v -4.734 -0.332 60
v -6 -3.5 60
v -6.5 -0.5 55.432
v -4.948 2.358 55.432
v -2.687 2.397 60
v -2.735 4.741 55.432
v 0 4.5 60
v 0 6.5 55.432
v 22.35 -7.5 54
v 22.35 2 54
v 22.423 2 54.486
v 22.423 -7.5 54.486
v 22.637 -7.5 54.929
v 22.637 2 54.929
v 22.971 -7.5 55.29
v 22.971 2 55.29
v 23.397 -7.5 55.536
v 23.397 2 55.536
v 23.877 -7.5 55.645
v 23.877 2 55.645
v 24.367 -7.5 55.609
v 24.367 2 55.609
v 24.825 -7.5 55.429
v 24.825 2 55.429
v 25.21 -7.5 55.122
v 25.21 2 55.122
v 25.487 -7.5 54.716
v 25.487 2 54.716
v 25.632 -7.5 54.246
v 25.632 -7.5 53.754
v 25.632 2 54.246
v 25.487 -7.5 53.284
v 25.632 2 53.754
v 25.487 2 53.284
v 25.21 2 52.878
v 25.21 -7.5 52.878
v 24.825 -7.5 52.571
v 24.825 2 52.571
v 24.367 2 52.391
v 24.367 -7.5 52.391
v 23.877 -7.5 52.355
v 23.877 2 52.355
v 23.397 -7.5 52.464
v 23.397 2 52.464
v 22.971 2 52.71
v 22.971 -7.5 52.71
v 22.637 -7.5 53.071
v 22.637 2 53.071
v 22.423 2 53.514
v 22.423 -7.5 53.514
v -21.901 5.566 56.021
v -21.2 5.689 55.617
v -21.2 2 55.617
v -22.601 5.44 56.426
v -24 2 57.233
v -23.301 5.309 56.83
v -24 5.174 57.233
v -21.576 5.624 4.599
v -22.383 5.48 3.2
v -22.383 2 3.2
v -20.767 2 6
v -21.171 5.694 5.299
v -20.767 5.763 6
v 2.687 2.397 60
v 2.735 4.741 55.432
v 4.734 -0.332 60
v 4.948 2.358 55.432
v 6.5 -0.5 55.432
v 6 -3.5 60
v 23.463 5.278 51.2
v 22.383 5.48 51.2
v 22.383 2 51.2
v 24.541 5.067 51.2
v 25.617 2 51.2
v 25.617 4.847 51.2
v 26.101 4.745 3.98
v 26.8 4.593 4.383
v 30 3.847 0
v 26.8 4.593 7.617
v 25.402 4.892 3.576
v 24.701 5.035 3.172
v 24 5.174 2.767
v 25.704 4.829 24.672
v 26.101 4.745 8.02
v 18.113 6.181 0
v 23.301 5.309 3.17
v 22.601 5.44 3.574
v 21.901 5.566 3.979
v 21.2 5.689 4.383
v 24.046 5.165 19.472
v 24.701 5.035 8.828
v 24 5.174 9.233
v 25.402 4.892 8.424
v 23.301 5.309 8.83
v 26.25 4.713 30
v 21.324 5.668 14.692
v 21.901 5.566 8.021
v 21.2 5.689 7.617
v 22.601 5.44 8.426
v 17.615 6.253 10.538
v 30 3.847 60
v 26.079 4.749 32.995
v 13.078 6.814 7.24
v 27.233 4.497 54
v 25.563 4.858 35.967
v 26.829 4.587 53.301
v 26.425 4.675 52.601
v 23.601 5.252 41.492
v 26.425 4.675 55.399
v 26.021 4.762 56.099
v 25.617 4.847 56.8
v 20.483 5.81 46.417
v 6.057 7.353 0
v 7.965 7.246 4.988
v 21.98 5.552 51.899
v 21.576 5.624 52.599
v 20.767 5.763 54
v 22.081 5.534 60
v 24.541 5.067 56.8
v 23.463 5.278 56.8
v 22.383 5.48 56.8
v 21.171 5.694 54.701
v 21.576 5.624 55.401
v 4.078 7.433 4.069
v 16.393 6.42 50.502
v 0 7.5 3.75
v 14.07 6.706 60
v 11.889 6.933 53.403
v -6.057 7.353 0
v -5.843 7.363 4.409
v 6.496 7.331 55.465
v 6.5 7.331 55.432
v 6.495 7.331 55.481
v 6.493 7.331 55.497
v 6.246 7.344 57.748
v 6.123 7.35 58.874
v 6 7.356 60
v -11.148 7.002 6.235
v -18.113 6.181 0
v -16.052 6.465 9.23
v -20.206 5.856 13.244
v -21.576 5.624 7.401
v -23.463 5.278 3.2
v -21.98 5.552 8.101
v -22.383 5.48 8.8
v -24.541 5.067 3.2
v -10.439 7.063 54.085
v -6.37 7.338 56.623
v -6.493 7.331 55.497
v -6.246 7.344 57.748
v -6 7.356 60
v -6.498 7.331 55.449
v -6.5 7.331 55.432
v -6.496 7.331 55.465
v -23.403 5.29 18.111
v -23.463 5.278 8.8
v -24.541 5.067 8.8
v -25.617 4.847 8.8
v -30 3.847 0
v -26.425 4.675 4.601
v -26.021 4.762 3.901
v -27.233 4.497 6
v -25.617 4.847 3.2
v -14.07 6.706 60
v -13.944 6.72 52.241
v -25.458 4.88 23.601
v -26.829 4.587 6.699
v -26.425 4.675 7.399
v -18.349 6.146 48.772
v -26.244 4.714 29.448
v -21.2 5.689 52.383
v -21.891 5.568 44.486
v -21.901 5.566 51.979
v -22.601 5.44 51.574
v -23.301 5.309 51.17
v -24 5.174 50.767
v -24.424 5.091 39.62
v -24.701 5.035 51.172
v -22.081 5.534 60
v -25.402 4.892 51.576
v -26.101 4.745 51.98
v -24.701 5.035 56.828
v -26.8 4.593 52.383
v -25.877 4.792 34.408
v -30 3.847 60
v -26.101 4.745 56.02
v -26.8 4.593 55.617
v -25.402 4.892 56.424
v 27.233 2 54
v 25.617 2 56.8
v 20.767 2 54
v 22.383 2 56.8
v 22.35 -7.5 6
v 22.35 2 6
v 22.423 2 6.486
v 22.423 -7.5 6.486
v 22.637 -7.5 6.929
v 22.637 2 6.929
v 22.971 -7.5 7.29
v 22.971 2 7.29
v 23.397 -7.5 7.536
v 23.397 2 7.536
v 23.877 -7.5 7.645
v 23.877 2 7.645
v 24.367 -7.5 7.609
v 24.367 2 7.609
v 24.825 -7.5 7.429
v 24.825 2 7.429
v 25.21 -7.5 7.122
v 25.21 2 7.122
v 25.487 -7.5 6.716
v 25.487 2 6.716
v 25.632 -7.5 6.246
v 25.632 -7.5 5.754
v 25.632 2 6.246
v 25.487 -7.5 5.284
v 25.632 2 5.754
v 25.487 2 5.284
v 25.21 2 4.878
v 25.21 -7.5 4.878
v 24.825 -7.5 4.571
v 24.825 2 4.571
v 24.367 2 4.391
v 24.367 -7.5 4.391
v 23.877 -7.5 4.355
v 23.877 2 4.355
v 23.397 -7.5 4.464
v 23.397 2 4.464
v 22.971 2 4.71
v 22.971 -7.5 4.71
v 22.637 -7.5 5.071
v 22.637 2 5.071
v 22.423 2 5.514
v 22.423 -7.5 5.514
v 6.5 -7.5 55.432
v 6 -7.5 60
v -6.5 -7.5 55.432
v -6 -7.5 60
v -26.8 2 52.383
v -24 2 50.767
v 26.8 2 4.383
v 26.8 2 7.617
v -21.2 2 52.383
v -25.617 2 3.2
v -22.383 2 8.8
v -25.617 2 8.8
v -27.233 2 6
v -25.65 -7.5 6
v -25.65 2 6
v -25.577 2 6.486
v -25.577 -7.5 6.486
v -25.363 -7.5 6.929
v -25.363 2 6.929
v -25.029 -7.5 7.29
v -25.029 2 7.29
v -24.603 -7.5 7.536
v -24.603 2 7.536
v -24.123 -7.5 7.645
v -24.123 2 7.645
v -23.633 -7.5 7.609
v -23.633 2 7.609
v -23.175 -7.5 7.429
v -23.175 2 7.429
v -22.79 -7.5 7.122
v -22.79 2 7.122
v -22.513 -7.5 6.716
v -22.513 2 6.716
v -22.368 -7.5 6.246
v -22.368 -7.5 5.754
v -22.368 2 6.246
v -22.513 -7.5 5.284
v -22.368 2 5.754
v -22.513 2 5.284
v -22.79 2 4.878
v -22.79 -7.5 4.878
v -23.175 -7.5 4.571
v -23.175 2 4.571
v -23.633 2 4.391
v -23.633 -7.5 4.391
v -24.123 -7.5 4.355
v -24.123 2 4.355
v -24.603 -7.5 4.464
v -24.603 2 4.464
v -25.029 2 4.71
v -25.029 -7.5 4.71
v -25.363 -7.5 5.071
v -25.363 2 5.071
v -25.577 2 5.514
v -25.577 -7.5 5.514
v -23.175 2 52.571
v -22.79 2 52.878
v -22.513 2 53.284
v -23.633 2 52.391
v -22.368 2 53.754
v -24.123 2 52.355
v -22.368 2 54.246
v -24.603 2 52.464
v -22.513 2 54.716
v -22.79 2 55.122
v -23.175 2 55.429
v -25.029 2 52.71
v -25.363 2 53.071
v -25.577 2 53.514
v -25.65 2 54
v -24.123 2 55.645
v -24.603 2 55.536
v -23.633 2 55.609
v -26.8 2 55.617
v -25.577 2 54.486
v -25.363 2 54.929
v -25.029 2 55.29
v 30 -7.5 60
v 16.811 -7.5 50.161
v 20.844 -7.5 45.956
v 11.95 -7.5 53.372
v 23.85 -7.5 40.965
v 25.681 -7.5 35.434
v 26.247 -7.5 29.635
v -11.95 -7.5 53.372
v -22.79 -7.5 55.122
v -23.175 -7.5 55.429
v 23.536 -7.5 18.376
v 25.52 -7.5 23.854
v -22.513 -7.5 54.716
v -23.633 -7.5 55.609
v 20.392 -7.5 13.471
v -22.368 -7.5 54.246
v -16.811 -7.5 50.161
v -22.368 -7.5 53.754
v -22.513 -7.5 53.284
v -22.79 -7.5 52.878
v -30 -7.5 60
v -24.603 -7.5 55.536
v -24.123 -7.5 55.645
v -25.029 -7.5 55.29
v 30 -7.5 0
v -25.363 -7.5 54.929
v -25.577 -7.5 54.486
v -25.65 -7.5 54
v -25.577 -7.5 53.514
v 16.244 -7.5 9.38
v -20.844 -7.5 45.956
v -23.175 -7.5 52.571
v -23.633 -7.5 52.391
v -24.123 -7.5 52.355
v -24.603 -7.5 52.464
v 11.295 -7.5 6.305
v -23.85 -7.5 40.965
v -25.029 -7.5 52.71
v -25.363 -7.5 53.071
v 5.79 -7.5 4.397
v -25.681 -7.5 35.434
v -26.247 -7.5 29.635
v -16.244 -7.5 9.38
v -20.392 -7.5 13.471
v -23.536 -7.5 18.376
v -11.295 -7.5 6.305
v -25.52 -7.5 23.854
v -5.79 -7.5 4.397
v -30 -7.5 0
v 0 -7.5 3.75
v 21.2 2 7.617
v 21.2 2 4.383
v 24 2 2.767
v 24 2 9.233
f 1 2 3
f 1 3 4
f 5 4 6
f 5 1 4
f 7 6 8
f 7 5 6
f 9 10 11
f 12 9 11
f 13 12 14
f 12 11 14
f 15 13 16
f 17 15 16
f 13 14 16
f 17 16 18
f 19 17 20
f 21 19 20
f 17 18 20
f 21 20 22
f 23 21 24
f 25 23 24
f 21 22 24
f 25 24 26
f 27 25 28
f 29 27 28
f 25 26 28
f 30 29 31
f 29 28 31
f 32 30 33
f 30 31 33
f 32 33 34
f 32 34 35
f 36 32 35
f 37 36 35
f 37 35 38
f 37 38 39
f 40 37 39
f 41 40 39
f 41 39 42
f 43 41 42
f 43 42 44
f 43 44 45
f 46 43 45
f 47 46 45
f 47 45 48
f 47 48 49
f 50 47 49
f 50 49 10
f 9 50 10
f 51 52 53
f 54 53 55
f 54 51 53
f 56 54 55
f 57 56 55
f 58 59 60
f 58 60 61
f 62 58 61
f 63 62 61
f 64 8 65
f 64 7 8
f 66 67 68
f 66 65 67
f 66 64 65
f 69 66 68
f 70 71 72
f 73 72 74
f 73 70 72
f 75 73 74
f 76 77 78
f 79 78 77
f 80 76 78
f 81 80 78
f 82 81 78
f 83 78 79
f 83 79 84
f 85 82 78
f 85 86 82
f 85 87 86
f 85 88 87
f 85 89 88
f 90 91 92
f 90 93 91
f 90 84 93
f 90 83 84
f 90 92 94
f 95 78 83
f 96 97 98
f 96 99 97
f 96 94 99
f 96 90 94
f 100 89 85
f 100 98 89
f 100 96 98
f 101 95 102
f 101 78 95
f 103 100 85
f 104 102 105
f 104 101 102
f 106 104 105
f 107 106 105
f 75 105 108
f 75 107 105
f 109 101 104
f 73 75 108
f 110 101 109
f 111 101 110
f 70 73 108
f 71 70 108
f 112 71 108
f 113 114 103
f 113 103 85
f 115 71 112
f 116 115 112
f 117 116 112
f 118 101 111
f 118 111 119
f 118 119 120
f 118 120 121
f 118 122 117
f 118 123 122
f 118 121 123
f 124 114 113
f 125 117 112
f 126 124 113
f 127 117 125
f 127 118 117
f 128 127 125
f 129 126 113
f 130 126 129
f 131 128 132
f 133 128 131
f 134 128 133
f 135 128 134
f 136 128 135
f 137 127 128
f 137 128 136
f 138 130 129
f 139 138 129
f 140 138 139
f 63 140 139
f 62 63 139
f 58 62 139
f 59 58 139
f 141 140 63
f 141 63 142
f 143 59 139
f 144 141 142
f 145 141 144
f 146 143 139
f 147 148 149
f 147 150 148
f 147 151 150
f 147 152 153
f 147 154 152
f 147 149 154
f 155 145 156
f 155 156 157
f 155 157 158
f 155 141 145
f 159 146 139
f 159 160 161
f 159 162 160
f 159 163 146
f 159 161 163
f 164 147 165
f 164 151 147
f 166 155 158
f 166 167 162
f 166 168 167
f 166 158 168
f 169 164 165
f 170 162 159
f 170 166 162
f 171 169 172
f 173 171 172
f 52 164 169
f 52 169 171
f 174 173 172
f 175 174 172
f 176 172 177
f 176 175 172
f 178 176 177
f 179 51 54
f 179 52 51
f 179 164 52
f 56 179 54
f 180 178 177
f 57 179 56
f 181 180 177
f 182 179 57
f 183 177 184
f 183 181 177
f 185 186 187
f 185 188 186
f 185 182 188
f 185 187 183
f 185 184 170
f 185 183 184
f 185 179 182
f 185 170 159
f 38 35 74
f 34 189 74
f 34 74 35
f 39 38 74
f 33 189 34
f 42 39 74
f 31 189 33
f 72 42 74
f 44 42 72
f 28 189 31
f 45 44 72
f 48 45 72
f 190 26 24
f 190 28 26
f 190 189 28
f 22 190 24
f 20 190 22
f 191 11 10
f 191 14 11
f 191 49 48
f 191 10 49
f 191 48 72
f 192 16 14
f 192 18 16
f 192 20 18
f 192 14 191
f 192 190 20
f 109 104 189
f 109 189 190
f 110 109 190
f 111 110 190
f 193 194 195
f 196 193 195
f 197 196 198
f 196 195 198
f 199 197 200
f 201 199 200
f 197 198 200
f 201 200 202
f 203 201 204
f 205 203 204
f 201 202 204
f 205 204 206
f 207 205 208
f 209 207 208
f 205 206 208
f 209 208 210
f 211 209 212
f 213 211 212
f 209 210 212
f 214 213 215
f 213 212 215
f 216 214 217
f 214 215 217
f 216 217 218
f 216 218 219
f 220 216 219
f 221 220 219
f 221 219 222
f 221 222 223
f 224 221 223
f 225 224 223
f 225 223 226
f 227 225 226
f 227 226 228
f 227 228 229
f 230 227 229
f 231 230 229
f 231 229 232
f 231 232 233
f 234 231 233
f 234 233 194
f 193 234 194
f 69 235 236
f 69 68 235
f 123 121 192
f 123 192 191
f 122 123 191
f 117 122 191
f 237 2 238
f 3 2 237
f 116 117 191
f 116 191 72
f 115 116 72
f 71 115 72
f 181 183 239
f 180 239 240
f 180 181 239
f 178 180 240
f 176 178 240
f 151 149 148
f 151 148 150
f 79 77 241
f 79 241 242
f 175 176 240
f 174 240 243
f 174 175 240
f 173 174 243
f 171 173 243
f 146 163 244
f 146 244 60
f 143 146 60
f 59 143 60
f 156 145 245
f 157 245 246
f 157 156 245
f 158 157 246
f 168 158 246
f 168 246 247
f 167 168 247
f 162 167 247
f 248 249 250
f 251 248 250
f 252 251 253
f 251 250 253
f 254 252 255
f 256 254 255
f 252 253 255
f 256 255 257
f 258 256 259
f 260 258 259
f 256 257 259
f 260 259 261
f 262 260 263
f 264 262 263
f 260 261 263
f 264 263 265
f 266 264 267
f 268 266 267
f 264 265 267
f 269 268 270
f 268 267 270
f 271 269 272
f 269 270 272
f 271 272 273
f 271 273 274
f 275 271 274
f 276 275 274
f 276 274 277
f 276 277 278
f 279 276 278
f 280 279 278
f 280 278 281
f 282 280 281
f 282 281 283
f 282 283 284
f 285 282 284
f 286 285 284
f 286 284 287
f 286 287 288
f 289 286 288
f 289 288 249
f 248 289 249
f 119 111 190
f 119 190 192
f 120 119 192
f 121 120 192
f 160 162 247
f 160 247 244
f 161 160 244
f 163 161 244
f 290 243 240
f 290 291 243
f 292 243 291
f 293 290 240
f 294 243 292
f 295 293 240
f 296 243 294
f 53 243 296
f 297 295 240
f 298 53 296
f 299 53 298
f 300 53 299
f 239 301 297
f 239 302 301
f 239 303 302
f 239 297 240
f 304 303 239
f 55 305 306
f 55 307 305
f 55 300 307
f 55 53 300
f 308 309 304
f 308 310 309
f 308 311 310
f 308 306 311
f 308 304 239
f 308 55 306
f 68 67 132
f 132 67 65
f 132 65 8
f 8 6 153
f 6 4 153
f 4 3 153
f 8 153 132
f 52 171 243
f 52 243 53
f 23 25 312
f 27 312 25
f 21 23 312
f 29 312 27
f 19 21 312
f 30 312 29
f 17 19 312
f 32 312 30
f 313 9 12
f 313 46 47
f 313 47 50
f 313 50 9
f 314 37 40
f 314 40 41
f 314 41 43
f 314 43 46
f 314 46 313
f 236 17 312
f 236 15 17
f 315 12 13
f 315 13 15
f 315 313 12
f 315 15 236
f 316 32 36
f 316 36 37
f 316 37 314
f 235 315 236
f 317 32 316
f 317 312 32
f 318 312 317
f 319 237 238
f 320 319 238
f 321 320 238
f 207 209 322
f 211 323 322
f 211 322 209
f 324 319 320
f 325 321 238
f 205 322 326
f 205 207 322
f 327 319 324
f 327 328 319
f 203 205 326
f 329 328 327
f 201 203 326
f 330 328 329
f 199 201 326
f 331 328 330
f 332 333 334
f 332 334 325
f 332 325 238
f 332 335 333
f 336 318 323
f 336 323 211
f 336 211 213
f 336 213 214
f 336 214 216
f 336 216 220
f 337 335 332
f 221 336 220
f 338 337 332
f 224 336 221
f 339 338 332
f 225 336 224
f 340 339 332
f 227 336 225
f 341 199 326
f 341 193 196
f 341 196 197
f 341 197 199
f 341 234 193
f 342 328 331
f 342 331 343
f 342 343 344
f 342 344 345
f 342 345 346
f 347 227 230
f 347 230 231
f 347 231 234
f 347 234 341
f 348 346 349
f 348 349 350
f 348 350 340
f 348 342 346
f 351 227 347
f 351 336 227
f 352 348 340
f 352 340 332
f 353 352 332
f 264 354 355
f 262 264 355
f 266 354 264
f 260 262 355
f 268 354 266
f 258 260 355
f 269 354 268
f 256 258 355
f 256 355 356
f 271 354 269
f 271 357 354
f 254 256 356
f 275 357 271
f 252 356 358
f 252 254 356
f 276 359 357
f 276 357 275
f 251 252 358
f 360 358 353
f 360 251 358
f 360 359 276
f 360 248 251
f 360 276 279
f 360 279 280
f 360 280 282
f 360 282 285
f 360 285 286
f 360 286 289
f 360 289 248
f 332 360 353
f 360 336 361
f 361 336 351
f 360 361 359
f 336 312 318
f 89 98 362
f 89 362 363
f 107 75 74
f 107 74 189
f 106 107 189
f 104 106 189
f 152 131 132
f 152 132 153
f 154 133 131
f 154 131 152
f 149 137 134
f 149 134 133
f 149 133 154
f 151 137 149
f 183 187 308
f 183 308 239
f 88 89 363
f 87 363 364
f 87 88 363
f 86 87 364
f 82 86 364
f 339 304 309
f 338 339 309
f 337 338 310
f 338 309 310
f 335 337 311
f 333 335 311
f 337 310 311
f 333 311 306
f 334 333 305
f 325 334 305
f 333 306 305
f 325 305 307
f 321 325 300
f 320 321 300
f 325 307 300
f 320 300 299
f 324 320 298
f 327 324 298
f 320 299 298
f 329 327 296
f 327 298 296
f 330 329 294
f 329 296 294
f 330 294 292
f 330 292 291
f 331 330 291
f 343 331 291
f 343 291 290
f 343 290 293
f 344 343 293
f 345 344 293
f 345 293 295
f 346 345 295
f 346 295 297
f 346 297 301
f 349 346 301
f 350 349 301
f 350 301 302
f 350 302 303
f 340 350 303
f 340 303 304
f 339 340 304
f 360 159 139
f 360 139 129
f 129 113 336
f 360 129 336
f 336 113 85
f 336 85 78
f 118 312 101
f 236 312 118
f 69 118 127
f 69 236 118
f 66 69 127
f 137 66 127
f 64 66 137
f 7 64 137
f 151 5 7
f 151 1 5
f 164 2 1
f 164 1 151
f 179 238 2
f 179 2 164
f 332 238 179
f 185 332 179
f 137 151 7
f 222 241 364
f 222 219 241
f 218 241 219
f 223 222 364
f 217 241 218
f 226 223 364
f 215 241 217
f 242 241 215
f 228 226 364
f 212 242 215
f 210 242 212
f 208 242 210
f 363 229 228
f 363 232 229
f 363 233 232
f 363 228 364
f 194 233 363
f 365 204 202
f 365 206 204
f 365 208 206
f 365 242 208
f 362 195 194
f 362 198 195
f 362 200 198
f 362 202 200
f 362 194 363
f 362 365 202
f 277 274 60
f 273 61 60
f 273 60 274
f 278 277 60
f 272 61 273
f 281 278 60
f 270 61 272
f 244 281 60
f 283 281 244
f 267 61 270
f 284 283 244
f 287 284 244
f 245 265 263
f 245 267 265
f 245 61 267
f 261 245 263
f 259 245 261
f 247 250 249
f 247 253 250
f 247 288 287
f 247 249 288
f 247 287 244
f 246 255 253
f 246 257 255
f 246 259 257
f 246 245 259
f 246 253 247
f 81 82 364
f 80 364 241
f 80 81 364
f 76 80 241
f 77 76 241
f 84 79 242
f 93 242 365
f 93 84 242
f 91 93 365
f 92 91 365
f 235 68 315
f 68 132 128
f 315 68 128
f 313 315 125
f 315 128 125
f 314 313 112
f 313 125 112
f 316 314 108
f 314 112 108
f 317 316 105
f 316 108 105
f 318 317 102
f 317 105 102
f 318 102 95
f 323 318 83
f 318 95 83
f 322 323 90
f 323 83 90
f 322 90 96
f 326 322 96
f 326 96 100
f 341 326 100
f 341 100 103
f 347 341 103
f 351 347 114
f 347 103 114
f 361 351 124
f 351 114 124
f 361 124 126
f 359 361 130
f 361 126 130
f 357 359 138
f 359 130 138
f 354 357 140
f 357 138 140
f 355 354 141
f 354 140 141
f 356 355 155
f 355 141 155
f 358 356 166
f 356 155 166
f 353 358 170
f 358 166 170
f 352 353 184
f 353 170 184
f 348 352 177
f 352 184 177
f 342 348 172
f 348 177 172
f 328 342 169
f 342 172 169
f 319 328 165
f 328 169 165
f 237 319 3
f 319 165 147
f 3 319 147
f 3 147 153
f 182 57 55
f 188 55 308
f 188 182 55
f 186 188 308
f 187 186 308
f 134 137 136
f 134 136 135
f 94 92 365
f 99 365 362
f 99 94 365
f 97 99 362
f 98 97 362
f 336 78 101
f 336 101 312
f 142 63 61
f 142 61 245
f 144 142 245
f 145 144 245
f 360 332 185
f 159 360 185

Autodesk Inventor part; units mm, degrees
ref_plane "YZ Plane" through (0, 0, 0) normal (1, 0, 0) x (0, 1, 0)
sketch "Sketch1" plane through (0, 0, 0) normal (0, 0, 1) x (1, 0, 0)
  line L0 (-30, 7.5) -> (30, 7.5)
  line L1 (30, 7.5) -> (30, -7.5)
  line L2 (30, -7.5) -> (-30, -7.5)
  line L3 (-30, -7.5) -> (-30, 7.5)
  line L4 (-30, 7.5) -> (30, -7.5) construction
  line L5 (30, 7.5) -> (-30, -7.5) construction
  point P0 (0, 0)
  dimension "d0" = 60
  dimension "d1" = 15
extrude "Extrusion1" add sketch "Sketch1" along normal blind 60
sketch "Sketch3" plane through (-30, 7.5, 0) normal (0, 1, 0) x (1, 0, 0)
  circle A0 centre (30, -30) radius 26.25
  line L0 (60, 0) -> (0, 0) projected
  line L1 (60, -60) -> (0, -60) projected
  line L2 (60, 0) -> (60, -60) projected
  line L3 (36.5, -55.4325) -> (36, -60)
  line L4 (36, -60) -> (24, -60)
  line L5 (24, -60) -> (23.5, -55.4325)
  point P0 (30, 0)
  point P1 (31.6579, -56.1976)
  point P2 (30, 0)
  point P3 (60, -30)
  point P4 (30, -60)
  point P5 (24, -60)
  dimension "d14" = 52.5
  dimension "d16" = 30
  dimension "d17" = 12
  dimension "d18" = 13
  dimension "d26" = 25.4325
extrude "Extrusion3" cut sketch "Sketch3" against normal blind 15
sketch "Sketch4" plane through (0, 0, 60) normal (0, 0, 1) x (1, 0, 0)
  circle A0 centre (0, -117.5) radius 125
  line L0 (-26.25, 7.5) -> (26.25, 7.5) projected
  point P0 (0, 0)
  point P1 (-6.5, 7.5)
  point P2 (6.5, 7.5)
  dimension "d19" = 250
extrude "Extrusion4" cut sketch "Sketch4" against normal through all keep common part
sketch "Sketch6" plane through (0, 0, 60) normal (0, 0, 1) x (1, 0, 0)
  arc A0 (0, 4.5) -> (-6, -3.5) centre (6.6, -6.7) ccw
  line L0 (0, 0) -> (0, -5.1929) construction
  arc A1 (6, -3.5) -> (0, 4.5) centre (-6.6, -6.7) ccw
  line L1 (-6, -3.5) -> (-6, 7.3559)
  line L2 (6, 7.3559) -> (6, -3.5)
  line L3 (-6, 7.3559) -> (6, 7.3559)
  line L4 (26.25, -7.5) -> (-26.25, -7.5) construction
  line L5 (-6, -7.5) -> (-6, 7.3559) construction
  point P0 (6.5, -7.5)
  point P1 (-6.5, -7.5)
  dimension "d27" = 13
  dimension "d31" = 12
  dimension "d35" = 4
ref_plane "Work Plane1" through (6.5, 7.3309, 55.4325) normal (0, 0, 1) x (1, 0, 0)
sketch "Sketch7" plane through (6.5, 7.3309, 55.4325) normal (0, 0, 1) x (1, 0, 0)
  line L0 (19.75, -14.8309) -> (-32.75, -14.8309) construction
  line L1 (-6.5, -14.8309) -> (-6.5, -0.6329) construction
  line L2 (-13, 0) -> (-13, -14.8309) construction
  line L3 (0, 0) -> (0, -14.8309) construction
  line L4 (-6.5, -14.8309) -> (-6.5, 0.8827) construction
  arc A0 (-6.5, -0.8309) -> (-13, -7.8309) centre (-0.8899, -12.5581) ccw
  arc A1 (0, -7.8309) -> (-6.5, -0.8309) centre (-12.1101, -12.5581) ccw
  line L5 (-13, 0) -> (0, 0)
  line L6 (-13, -7.8309) -> (-13, 0)
  line L7 (0, -7.8309) -> (0, 0)
  dimension "d32" = 14
  dimension "d33" = 13
  dimension "d34" = 7
loft "Loft1" add profiles "Sketch7", "Sketch6"
ref_plane "Work Plane2" through (0, 7.5, 60) normal (0, 1, 0) x (-1, 0, 0)
sketch "Sketch8" plane through (0, 7.5, 60) normal (0, 1, 0) x (-1, 0, 0)
  line L0 (22.3834, -56.8) -> (20.7668, -54)
  line L1 (20.7668, -54) -> (22.3834, -51.2)
  line L2 (22.3834, -51.2) -> (25.6166, -51.2)
  line L3 (25.6166, -51.2) -> (27.2332, -54)
  line L4 (27.2332, -54) -> (25.6166, -56.8)
  line L5 (25.6166, -56.8) -> (22.3834, -56.8)
  arc A0 (-6.5, -4.5675) -> (6.5, -4.5675) centre (0, -30) ccw construction
  line L6 (26.8, -7.6166) -> (24, -9.2332)
  line L7 (24, -9.2332) -> (21.2, -7.6166)
  line L8 (21.2, -7.6166) -> (21.2, -4.3834)
  line L9 (21.2, -4.3834) -> (24, -2.7668)
  line L10 (24, -2.7668) -> (26.8, -4.3834)
  line L11 (26.8, -4.3834) -> (26.8, -7.6166)
  line L12 (-22.3834, -3.2) -> (-20.7668, -6)
  line L13 (-20.7668, -6) -> (-22.3834, -8.8)
  line L14 (-22.3834, -8.8) -> (-25.6166, -8.8)
  line L15 (-25.6166, -8.8) -> (-27.2332, -6)
  line L16 (-27.2332, -6) -> (-25.6166, -3.2)
  line L17 (-25.6166, -3.2) -> (-22.3834, -3.2)
  line L18 (-26.8, -52.3834) -> (-24, -50.7668)
  line L19 (-24, -50.7668) -> (-21.2, -52.3834)
  line L20 (-21.2, -52.3834) -> (-21.2, -55.6166)
  line L21 (-21.2, -55.6166) -> (-24, -57.2332)
  line L22 (-24, -57.2332) -> (-26.8, -55.6166)
  line L23 (-26.8, -55.6166) -> (-26.8, -52.3834)
  point P0 (0, -60)
  point P1 (24, -54)
  point P2 (0, -56.25)
  point P3 (0, -30)
  point P4 (24, -6)
  point P5 (-24, -6)
  point P6 (-24, -54)
  dimension "d40" = 24
  dimension "d41" = 5.6
  dimension "d42" = 24
  dimension "d45" = 360
extrude "Extrusion5" cut sketch "Sketch8" against normal blind 5.5
sketch "Sketch9" plane through (0, 7.5, 60) normal (0, 1, 0) x (-1, 0, 0)
  circle A0 centre (24, -54) radius 1.65
  arc A1 (-6.5, -4.5675) -> (6.5, -4.5675) centre (0, -30) ccw construction
  circle A2 centre (24, -6) radius 1.65
  circle A3 centre (-24, -6) radius 1.65
  circle A4 centre (-24, -54) radius 1.65
  point P0 (0, -60)
  point P1 (0, -56.25)
  point P2 (0, -30)
  dimension "d49" = 3.3
  dimension "d50" = 24
  dimension "d51" = 24
  dimension "d54" = 360
extrude "Extrusion6" cut sketch "Sketch9" against normal through all
properties part number "antenna_socket" material "Acetal Resin, Black"
